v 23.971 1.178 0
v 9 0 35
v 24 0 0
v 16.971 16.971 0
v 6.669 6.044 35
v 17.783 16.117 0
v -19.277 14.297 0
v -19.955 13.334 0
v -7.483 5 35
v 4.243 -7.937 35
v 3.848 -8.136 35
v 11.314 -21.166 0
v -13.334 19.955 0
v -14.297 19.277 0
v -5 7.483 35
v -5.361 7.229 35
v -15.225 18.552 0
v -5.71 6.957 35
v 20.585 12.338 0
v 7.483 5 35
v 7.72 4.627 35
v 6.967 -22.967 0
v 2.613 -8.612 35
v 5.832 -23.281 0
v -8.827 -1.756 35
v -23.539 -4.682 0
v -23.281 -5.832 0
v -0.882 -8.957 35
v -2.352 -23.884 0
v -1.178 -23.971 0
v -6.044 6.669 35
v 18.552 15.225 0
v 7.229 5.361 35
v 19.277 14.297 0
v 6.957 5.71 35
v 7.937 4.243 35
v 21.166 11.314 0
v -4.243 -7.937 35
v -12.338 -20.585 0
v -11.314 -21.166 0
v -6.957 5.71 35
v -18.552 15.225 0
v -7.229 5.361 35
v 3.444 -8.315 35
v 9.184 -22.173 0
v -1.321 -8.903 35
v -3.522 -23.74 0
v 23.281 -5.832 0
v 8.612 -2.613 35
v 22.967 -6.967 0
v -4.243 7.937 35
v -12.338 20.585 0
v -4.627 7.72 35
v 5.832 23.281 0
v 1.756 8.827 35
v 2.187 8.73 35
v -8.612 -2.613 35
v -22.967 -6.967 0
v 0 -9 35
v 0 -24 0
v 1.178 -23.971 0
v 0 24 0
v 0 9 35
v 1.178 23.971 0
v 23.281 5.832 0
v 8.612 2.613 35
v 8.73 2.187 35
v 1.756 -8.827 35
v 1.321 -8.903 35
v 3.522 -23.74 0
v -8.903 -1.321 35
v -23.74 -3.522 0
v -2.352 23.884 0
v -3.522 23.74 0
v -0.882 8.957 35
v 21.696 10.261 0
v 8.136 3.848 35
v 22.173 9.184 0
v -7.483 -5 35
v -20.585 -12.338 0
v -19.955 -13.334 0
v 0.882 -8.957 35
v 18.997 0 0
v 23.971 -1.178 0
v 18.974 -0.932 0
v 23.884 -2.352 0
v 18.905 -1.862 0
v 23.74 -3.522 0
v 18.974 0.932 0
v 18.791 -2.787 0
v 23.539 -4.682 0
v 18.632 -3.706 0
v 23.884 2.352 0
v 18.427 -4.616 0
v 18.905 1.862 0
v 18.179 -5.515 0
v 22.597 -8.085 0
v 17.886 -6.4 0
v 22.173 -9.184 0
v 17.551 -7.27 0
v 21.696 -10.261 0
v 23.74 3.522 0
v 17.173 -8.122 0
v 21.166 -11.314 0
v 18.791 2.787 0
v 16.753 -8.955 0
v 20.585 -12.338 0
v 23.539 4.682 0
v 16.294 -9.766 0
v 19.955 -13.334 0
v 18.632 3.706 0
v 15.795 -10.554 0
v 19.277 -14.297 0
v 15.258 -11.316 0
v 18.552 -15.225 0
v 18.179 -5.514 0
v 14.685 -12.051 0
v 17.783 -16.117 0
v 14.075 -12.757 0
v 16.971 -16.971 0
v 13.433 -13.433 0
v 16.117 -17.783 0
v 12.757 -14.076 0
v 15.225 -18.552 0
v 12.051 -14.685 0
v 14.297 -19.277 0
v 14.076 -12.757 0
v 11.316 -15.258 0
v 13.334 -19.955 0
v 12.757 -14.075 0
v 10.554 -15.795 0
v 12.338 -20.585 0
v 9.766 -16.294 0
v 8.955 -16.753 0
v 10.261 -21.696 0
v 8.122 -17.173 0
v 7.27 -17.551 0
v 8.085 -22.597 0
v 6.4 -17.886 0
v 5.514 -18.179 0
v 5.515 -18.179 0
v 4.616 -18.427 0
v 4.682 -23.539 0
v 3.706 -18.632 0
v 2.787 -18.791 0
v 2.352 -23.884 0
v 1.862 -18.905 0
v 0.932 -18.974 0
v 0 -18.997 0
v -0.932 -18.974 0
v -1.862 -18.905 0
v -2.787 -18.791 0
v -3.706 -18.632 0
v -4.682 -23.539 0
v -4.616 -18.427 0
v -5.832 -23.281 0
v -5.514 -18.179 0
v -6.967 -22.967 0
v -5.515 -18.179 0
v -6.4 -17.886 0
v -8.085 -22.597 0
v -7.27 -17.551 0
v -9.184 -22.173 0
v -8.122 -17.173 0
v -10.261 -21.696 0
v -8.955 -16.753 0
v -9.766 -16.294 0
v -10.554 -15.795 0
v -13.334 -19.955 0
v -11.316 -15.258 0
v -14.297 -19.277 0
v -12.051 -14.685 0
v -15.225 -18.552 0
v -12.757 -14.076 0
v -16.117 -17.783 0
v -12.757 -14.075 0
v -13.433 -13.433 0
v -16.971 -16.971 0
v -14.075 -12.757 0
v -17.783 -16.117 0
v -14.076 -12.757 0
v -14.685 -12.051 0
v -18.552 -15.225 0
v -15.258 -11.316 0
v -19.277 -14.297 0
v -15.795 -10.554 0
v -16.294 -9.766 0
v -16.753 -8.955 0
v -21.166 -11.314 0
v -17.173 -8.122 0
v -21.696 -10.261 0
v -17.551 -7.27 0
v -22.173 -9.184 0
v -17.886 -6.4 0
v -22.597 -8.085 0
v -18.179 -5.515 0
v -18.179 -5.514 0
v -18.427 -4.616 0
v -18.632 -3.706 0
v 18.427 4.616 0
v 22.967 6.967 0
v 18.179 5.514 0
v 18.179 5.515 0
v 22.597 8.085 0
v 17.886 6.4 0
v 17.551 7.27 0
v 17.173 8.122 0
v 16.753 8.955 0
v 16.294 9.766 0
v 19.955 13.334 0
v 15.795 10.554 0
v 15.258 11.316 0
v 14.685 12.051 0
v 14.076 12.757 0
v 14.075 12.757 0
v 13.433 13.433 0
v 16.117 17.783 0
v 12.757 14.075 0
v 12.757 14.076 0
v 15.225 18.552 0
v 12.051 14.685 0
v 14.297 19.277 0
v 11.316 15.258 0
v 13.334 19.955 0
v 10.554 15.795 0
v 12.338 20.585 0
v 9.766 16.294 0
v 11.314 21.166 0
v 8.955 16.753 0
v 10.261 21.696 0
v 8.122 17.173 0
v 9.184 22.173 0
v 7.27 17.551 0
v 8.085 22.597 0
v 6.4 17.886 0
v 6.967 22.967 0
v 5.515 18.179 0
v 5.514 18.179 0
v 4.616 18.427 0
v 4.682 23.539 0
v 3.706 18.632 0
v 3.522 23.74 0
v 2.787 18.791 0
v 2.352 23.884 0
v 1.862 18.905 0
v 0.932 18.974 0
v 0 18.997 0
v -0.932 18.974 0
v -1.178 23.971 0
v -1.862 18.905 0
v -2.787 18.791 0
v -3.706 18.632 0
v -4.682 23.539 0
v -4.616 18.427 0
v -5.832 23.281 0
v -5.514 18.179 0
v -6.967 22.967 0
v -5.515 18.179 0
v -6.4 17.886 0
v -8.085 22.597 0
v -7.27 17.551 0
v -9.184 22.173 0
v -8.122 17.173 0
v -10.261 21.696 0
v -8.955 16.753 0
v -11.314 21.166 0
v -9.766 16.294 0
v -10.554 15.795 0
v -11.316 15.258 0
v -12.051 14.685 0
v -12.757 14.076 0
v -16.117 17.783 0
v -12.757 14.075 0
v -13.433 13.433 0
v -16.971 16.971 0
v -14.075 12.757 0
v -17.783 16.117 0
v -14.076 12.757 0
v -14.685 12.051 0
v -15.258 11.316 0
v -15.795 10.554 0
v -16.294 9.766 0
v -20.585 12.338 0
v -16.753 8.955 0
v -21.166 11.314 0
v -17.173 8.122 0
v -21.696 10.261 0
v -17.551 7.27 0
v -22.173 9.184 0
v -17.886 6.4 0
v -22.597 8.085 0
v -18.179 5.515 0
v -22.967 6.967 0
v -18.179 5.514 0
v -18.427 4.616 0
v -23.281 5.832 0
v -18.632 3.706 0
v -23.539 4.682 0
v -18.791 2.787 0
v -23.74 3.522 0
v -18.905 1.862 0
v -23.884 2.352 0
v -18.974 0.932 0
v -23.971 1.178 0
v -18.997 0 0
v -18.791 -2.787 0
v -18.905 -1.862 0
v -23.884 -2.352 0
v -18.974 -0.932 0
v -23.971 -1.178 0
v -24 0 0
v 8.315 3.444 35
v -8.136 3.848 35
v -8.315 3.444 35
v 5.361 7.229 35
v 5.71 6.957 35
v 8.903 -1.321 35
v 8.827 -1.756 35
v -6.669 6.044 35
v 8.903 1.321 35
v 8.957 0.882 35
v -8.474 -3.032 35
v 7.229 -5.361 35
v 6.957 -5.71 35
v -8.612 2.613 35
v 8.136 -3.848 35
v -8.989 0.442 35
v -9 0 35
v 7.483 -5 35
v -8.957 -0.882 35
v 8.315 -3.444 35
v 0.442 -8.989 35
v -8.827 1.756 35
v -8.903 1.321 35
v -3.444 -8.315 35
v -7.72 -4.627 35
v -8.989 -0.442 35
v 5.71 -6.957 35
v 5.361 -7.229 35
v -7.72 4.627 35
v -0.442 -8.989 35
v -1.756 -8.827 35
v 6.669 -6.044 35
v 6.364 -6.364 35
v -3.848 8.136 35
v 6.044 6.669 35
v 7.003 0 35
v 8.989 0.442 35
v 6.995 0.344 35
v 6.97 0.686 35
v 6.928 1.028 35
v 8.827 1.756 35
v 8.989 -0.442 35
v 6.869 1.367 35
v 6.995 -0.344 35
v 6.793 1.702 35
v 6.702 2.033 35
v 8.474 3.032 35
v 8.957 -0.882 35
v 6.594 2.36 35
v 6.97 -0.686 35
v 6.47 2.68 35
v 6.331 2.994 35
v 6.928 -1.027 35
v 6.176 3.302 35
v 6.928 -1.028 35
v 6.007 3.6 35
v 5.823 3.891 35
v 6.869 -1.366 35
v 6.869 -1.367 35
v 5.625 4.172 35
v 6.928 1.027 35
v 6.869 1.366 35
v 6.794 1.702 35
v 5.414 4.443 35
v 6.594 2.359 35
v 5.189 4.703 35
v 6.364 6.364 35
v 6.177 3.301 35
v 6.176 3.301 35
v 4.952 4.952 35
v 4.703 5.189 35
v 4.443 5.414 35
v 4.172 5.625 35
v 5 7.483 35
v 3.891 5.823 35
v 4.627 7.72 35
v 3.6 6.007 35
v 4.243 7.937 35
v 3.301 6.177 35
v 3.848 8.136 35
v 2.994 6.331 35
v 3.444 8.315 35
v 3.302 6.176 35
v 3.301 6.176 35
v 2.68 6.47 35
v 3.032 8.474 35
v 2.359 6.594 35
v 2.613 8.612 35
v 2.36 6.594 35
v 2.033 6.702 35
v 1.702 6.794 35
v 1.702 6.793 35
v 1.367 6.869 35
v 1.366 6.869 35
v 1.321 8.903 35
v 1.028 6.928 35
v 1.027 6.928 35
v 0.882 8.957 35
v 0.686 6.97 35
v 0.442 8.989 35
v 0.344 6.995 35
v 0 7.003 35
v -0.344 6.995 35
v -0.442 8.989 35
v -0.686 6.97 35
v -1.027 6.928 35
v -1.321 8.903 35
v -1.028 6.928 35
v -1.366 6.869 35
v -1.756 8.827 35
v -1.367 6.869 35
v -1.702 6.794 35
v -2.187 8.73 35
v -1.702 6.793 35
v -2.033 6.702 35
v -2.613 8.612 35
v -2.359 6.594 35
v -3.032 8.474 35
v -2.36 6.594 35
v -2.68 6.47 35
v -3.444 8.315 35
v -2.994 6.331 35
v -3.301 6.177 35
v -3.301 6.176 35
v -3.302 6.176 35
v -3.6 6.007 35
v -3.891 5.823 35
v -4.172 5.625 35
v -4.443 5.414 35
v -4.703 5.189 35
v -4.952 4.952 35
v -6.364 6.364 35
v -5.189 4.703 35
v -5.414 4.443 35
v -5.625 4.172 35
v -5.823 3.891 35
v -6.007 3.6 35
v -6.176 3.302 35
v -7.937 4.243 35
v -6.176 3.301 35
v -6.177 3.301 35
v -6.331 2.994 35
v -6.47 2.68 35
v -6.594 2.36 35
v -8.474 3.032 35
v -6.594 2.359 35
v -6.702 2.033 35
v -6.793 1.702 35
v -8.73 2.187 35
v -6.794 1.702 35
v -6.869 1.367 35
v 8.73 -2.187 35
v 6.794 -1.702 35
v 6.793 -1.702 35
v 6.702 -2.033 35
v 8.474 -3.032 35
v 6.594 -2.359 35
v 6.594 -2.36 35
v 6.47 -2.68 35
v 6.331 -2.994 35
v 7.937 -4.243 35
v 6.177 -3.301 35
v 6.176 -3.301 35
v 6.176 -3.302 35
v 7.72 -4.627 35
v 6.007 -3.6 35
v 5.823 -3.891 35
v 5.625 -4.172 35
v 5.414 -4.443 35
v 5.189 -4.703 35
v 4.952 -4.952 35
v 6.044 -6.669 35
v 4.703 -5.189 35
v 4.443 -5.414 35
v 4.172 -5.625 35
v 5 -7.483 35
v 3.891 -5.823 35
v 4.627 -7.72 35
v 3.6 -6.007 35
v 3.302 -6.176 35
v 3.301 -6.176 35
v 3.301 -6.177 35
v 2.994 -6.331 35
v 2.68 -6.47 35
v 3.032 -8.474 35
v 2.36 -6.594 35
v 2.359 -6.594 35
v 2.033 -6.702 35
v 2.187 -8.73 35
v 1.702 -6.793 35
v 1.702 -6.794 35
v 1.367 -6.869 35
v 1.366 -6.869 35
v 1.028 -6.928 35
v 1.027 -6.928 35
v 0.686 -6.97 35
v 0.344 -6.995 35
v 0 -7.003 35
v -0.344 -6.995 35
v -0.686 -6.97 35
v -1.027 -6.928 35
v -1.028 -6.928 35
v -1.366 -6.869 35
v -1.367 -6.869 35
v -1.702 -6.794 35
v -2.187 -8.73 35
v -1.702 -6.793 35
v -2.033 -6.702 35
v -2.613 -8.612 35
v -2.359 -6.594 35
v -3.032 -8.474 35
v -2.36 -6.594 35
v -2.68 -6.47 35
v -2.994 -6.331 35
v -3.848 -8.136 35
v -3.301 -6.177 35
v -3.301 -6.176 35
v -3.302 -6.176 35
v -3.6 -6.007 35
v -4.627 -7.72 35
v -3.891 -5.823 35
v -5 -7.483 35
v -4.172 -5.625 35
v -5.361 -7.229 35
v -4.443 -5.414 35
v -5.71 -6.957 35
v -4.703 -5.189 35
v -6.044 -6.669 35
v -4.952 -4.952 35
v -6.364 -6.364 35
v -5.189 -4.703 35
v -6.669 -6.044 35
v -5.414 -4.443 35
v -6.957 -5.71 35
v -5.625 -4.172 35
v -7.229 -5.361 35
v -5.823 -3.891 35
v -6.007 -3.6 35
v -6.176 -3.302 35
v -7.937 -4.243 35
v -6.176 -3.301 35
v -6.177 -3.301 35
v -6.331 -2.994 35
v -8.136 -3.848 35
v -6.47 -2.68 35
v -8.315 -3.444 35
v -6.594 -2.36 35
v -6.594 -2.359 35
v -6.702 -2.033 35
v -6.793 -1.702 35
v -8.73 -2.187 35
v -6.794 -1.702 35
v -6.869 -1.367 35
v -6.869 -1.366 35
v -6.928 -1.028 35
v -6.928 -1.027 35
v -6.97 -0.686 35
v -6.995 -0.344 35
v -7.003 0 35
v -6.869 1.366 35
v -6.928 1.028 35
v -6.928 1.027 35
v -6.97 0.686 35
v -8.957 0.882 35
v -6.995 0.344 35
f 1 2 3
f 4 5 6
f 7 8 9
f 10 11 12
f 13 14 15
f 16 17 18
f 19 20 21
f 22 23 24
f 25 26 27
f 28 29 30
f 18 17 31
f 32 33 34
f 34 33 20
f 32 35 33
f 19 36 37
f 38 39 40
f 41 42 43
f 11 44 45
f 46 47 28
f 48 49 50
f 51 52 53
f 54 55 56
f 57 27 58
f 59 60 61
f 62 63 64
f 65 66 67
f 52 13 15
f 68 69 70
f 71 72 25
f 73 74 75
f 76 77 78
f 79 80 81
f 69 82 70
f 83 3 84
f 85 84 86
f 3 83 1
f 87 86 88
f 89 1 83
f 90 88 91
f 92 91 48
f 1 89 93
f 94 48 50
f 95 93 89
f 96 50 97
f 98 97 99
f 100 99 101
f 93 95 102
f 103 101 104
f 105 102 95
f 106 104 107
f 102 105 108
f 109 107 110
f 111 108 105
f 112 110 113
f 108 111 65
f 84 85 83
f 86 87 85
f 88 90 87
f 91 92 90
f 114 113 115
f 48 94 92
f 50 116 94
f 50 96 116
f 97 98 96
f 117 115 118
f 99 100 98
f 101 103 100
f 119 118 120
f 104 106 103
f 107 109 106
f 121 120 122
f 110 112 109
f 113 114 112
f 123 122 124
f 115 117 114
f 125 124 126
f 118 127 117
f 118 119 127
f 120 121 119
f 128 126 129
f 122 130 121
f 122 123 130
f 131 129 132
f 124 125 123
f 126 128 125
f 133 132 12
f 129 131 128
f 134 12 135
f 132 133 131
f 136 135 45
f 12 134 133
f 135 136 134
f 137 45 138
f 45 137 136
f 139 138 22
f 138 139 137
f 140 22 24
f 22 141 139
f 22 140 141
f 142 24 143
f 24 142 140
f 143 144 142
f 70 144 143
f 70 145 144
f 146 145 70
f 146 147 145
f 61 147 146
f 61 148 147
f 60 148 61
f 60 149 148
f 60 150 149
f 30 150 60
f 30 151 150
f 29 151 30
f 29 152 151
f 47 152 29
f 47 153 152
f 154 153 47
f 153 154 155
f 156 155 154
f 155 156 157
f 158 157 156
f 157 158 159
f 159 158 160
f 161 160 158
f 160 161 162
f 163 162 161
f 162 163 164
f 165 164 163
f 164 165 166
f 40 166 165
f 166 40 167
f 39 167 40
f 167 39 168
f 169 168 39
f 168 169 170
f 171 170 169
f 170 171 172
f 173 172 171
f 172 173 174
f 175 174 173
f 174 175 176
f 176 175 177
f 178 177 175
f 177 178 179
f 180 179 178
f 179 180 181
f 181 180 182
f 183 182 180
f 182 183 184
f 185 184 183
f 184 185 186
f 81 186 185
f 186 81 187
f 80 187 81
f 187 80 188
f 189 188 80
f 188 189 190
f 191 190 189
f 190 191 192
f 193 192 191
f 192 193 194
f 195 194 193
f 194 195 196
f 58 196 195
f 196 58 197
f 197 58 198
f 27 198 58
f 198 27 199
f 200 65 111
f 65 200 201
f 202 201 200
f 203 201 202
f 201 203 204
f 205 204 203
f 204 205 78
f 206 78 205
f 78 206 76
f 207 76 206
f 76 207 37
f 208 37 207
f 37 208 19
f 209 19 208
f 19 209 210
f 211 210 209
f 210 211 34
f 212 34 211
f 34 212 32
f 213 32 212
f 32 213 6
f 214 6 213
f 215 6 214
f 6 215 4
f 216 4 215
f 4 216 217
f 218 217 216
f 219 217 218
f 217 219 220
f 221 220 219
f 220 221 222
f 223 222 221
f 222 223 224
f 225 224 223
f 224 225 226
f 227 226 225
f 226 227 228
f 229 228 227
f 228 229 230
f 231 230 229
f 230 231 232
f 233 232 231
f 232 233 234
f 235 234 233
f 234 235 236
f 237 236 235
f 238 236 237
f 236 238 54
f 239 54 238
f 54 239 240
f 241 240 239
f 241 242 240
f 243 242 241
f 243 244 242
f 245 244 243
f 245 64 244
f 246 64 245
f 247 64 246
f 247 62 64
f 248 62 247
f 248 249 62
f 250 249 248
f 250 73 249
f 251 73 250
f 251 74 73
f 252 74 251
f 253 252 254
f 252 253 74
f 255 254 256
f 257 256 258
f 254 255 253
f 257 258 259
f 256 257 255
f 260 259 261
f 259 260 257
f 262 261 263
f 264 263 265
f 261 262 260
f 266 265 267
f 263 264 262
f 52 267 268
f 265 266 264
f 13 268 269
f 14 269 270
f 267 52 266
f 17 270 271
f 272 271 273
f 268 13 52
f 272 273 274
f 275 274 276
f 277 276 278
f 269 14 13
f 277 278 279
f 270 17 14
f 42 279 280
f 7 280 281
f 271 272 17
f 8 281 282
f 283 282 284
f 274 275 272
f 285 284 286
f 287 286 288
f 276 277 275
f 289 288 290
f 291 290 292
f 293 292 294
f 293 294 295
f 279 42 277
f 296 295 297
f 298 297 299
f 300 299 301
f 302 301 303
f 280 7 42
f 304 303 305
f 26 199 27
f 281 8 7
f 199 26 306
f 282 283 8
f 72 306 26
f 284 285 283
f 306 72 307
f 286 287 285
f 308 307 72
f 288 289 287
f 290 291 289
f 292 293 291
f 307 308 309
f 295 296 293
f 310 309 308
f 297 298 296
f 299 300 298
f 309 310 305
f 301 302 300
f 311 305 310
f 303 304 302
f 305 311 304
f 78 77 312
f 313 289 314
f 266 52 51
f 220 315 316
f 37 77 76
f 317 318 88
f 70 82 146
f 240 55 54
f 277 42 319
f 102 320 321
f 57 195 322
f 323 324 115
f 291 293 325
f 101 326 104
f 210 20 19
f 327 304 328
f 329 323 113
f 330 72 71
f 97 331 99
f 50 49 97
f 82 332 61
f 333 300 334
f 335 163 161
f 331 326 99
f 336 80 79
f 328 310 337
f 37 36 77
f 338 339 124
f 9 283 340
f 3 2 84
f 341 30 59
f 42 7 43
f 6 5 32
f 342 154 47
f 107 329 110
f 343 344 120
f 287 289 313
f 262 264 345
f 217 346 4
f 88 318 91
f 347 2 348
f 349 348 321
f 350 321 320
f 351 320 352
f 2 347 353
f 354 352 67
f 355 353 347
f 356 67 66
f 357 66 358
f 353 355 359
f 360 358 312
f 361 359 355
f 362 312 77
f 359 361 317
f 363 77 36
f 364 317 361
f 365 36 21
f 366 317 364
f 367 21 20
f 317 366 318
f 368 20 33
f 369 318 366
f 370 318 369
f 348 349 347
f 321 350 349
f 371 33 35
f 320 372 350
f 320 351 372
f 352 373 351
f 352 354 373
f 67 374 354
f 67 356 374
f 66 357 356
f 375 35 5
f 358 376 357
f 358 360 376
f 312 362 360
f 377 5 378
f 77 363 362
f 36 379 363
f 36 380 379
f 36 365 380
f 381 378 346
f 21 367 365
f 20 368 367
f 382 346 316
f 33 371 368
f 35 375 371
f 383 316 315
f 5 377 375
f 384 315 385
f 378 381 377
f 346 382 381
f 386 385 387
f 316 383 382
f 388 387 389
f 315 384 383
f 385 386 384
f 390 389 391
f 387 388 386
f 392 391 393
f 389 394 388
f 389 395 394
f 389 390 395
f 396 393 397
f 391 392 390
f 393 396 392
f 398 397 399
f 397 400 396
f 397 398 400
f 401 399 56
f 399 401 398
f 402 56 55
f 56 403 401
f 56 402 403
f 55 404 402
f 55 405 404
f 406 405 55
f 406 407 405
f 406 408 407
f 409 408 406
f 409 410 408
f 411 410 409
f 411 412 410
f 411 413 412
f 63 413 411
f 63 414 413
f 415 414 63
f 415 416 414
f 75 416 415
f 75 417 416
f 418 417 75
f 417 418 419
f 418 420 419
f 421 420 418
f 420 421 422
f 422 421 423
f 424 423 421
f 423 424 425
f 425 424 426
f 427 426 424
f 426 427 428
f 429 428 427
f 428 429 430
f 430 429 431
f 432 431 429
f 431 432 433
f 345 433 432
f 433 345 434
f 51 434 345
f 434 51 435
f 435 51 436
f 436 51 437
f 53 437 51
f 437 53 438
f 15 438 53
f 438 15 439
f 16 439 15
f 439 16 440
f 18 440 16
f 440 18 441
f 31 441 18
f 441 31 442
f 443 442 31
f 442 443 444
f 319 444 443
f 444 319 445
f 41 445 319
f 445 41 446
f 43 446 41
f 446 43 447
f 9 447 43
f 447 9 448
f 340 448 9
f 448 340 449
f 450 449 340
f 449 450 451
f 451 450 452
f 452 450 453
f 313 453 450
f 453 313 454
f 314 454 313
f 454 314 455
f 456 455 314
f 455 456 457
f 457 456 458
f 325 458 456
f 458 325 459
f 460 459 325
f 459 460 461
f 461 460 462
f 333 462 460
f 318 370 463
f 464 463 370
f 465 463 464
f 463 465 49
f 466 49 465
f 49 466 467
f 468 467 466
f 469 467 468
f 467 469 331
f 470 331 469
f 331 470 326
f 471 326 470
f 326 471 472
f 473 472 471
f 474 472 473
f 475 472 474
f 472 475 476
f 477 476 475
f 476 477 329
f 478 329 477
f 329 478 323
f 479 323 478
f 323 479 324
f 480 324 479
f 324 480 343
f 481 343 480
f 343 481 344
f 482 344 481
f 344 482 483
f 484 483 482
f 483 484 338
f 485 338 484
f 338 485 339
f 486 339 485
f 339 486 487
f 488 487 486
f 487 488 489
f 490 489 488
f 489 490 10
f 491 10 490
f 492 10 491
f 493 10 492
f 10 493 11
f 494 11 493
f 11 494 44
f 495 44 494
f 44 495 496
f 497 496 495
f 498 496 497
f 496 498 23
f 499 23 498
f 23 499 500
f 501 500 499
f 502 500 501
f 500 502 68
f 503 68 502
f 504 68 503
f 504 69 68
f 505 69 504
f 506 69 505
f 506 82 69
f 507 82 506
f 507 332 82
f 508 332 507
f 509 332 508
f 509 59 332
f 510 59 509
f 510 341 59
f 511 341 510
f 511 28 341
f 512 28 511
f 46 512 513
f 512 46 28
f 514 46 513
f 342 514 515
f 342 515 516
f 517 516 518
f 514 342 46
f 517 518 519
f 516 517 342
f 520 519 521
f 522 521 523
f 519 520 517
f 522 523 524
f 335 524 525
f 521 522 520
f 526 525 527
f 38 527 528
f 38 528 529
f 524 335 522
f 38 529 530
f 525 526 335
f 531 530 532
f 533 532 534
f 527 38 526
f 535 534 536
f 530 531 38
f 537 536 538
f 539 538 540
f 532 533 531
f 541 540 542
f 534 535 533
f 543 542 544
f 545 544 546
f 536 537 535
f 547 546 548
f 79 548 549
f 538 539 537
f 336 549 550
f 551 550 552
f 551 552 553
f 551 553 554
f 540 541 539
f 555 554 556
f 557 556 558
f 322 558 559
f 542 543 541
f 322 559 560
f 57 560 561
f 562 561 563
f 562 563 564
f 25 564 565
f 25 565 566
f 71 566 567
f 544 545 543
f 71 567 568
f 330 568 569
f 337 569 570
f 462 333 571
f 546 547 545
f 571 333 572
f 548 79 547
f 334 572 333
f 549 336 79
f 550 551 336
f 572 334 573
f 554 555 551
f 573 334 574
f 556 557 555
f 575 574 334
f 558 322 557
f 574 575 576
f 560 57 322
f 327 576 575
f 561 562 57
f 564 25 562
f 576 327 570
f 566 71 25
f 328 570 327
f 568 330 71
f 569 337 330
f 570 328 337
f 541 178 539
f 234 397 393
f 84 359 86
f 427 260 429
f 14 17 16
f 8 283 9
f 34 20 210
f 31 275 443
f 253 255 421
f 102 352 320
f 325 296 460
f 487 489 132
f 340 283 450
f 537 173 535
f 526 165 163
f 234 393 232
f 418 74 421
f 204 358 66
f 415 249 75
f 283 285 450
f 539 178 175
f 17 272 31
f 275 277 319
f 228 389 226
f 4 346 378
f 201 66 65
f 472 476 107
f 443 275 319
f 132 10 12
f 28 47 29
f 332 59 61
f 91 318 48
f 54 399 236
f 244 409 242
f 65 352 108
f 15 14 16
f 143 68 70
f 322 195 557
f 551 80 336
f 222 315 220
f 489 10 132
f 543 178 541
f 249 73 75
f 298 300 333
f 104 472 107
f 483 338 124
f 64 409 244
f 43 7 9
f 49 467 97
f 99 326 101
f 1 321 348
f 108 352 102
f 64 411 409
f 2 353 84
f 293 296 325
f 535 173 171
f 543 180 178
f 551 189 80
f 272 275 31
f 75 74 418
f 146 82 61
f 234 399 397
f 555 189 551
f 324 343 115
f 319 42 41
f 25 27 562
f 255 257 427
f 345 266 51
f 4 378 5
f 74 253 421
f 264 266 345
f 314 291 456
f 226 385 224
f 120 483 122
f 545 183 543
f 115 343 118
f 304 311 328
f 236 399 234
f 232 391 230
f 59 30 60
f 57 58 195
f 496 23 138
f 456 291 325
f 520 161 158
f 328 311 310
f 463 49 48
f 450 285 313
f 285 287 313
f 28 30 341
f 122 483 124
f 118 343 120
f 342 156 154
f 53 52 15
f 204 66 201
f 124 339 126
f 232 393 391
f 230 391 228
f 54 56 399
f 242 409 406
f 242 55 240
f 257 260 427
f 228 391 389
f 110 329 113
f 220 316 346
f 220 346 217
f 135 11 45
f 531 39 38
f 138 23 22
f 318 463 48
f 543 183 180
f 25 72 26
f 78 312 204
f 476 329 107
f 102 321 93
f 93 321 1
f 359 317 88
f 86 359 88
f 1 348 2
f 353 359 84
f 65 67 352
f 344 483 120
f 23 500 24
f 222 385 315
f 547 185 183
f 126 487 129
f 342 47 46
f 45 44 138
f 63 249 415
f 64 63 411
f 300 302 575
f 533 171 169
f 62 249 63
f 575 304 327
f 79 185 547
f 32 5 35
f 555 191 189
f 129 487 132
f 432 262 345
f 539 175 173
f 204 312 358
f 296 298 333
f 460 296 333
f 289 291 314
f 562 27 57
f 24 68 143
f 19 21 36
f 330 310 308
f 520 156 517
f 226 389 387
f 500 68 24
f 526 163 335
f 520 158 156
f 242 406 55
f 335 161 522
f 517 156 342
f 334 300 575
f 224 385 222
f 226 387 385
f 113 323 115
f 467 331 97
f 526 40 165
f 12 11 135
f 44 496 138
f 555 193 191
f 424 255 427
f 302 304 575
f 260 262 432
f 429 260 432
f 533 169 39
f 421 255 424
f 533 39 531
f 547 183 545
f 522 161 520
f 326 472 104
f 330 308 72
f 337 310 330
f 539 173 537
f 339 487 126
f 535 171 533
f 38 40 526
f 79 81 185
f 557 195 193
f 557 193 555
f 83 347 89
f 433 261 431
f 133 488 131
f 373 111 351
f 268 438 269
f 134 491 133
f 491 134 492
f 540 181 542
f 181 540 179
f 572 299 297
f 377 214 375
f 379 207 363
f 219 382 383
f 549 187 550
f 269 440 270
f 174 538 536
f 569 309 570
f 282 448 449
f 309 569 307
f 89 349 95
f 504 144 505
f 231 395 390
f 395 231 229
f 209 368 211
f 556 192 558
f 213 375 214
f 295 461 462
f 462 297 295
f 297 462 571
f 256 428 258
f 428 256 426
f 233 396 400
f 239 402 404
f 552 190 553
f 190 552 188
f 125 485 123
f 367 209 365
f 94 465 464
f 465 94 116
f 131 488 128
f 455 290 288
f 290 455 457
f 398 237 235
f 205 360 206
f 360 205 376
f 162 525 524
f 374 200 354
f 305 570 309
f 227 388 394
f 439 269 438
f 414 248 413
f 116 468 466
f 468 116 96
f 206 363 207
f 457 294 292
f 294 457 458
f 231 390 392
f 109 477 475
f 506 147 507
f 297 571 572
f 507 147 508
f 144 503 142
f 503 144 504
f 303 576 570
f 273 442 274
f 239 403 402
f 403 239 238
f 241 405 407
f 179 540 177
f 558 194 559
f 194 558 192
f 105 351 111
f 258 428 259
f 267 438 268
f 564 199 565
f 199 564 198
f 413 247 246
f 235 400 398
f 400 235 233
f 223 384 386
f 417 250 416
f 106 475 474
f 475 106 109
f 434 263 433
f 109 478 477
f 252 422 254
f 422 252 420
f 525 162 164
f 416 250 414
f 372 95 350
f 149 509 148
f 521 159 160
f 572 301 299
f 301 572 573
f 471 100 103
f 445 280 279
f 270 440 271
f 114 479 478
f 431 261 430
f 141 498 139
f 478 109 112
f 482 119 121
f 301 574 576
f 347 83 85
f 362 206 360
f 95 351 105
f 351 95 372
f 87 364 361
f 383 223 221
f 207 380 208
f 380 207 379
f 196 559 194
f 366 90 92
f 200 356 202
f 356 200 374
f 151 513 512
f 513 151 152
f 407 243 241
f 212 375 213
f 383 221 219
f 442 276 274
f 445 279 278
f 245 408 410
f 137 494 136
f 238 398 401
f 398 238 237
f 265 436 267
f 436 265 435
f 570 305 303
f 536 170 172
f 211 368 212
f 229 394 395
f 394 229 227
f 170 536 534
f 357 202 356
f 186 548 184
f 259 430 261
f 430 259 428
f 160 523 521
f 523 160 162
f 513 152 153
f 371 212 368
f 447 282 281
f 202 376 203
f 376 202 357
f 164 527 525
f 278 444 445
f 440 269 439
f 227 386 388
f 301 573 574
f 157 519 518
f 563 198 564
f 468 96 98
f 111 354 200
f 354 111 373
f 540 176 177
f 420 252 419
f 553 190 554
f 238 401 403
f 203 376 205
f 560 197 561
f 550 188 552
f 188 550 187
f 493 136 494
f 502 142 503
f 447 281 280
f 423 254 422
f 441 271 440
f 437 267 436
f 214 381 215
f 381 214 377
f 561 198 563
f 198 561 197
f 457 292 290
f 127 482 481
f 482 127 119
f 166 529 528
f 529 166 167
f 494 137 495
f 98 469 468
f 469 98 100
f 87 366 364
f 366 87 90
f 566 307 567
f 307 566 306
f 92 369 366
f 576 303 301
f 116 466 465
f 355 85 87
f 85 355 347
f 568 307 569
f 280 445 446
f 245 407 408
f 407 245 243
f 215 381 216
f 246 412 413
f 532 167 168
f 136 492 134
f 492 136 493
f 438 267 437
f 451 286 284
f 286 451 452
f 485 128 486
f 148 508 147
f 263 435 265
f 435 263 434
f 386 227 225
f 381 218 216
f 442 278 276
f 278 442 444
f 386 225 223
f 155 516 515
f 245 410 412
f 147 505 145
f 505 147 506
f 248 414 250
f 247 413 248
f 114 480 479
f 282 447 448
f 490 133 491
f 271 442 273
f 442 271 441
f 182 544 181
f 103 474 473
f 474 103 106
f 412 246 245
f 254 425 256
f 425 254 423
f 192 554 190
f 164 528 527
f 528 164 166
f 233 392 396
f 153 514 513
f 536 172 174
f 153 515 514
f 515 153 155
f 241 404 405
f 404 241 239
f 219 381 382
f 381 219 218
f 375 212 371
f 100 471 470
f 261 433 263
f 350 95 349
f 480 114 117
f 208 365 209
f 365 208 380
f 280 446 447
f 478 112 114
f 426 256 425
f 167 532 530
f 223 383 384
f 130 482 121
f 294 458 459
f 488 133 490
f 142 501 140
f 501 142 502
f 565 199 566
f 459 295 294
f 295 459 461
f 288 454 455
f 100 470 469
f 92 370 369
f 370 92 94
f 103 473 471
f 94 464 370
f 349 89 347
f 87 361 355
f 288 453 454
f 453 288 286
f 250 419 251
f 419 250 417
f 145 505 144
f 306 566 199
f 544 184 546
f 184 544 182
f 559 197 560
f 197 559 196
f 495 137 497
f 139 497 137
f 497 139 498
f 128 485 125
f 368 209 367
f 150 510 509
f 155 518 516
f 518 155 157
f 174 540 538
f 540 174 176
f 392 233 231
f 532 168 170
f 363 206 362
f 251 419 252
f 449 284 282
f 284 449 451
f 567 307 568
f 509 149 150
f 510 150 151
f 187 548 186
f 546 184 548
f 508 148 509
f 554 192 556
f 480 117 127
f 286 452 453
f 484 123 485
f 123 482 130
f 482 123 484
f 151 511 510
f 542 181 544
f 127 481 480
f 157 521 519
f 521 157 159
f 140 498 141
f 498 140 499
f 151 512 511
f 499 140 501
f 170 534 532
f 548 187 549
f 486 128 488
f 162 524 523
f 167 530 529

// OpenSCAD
// Parametric Optical Spacer - E-Dermatologist (Mobile Spacer Edition)
// Auto-generated by hardware/spacer_generator.py
// Units: millimetres. Render with F6 then export STL.

HEIGHT        = 35.0;
TOP_APERTURE  = 14.0;
BASE_CLEAR    = 38.0;
BASE_OUTER    = 48.0;
WALL_TOP      = 2.0;
SEG           = 128;

module spacer() {
    difference() {
        // Outer body: widening base flange tapering to the camera aperture.
        cylinder(h = HEIGHT,
                 d1 = BASE_OUTER,
                 d2 = TOP_APERTURE + 2 * WALL_TOP,
                 $fn = SEG);
        // Inner cavity: clear optical path.
        translate([0, 0, -0.01])
            cylinder(h = HEIGHT + 0.02,
                     d1 = BASE_CLEAR,
                     d2 = TOP_APERTURE,
                     $fn = SEG);
    }
}

spacer();
